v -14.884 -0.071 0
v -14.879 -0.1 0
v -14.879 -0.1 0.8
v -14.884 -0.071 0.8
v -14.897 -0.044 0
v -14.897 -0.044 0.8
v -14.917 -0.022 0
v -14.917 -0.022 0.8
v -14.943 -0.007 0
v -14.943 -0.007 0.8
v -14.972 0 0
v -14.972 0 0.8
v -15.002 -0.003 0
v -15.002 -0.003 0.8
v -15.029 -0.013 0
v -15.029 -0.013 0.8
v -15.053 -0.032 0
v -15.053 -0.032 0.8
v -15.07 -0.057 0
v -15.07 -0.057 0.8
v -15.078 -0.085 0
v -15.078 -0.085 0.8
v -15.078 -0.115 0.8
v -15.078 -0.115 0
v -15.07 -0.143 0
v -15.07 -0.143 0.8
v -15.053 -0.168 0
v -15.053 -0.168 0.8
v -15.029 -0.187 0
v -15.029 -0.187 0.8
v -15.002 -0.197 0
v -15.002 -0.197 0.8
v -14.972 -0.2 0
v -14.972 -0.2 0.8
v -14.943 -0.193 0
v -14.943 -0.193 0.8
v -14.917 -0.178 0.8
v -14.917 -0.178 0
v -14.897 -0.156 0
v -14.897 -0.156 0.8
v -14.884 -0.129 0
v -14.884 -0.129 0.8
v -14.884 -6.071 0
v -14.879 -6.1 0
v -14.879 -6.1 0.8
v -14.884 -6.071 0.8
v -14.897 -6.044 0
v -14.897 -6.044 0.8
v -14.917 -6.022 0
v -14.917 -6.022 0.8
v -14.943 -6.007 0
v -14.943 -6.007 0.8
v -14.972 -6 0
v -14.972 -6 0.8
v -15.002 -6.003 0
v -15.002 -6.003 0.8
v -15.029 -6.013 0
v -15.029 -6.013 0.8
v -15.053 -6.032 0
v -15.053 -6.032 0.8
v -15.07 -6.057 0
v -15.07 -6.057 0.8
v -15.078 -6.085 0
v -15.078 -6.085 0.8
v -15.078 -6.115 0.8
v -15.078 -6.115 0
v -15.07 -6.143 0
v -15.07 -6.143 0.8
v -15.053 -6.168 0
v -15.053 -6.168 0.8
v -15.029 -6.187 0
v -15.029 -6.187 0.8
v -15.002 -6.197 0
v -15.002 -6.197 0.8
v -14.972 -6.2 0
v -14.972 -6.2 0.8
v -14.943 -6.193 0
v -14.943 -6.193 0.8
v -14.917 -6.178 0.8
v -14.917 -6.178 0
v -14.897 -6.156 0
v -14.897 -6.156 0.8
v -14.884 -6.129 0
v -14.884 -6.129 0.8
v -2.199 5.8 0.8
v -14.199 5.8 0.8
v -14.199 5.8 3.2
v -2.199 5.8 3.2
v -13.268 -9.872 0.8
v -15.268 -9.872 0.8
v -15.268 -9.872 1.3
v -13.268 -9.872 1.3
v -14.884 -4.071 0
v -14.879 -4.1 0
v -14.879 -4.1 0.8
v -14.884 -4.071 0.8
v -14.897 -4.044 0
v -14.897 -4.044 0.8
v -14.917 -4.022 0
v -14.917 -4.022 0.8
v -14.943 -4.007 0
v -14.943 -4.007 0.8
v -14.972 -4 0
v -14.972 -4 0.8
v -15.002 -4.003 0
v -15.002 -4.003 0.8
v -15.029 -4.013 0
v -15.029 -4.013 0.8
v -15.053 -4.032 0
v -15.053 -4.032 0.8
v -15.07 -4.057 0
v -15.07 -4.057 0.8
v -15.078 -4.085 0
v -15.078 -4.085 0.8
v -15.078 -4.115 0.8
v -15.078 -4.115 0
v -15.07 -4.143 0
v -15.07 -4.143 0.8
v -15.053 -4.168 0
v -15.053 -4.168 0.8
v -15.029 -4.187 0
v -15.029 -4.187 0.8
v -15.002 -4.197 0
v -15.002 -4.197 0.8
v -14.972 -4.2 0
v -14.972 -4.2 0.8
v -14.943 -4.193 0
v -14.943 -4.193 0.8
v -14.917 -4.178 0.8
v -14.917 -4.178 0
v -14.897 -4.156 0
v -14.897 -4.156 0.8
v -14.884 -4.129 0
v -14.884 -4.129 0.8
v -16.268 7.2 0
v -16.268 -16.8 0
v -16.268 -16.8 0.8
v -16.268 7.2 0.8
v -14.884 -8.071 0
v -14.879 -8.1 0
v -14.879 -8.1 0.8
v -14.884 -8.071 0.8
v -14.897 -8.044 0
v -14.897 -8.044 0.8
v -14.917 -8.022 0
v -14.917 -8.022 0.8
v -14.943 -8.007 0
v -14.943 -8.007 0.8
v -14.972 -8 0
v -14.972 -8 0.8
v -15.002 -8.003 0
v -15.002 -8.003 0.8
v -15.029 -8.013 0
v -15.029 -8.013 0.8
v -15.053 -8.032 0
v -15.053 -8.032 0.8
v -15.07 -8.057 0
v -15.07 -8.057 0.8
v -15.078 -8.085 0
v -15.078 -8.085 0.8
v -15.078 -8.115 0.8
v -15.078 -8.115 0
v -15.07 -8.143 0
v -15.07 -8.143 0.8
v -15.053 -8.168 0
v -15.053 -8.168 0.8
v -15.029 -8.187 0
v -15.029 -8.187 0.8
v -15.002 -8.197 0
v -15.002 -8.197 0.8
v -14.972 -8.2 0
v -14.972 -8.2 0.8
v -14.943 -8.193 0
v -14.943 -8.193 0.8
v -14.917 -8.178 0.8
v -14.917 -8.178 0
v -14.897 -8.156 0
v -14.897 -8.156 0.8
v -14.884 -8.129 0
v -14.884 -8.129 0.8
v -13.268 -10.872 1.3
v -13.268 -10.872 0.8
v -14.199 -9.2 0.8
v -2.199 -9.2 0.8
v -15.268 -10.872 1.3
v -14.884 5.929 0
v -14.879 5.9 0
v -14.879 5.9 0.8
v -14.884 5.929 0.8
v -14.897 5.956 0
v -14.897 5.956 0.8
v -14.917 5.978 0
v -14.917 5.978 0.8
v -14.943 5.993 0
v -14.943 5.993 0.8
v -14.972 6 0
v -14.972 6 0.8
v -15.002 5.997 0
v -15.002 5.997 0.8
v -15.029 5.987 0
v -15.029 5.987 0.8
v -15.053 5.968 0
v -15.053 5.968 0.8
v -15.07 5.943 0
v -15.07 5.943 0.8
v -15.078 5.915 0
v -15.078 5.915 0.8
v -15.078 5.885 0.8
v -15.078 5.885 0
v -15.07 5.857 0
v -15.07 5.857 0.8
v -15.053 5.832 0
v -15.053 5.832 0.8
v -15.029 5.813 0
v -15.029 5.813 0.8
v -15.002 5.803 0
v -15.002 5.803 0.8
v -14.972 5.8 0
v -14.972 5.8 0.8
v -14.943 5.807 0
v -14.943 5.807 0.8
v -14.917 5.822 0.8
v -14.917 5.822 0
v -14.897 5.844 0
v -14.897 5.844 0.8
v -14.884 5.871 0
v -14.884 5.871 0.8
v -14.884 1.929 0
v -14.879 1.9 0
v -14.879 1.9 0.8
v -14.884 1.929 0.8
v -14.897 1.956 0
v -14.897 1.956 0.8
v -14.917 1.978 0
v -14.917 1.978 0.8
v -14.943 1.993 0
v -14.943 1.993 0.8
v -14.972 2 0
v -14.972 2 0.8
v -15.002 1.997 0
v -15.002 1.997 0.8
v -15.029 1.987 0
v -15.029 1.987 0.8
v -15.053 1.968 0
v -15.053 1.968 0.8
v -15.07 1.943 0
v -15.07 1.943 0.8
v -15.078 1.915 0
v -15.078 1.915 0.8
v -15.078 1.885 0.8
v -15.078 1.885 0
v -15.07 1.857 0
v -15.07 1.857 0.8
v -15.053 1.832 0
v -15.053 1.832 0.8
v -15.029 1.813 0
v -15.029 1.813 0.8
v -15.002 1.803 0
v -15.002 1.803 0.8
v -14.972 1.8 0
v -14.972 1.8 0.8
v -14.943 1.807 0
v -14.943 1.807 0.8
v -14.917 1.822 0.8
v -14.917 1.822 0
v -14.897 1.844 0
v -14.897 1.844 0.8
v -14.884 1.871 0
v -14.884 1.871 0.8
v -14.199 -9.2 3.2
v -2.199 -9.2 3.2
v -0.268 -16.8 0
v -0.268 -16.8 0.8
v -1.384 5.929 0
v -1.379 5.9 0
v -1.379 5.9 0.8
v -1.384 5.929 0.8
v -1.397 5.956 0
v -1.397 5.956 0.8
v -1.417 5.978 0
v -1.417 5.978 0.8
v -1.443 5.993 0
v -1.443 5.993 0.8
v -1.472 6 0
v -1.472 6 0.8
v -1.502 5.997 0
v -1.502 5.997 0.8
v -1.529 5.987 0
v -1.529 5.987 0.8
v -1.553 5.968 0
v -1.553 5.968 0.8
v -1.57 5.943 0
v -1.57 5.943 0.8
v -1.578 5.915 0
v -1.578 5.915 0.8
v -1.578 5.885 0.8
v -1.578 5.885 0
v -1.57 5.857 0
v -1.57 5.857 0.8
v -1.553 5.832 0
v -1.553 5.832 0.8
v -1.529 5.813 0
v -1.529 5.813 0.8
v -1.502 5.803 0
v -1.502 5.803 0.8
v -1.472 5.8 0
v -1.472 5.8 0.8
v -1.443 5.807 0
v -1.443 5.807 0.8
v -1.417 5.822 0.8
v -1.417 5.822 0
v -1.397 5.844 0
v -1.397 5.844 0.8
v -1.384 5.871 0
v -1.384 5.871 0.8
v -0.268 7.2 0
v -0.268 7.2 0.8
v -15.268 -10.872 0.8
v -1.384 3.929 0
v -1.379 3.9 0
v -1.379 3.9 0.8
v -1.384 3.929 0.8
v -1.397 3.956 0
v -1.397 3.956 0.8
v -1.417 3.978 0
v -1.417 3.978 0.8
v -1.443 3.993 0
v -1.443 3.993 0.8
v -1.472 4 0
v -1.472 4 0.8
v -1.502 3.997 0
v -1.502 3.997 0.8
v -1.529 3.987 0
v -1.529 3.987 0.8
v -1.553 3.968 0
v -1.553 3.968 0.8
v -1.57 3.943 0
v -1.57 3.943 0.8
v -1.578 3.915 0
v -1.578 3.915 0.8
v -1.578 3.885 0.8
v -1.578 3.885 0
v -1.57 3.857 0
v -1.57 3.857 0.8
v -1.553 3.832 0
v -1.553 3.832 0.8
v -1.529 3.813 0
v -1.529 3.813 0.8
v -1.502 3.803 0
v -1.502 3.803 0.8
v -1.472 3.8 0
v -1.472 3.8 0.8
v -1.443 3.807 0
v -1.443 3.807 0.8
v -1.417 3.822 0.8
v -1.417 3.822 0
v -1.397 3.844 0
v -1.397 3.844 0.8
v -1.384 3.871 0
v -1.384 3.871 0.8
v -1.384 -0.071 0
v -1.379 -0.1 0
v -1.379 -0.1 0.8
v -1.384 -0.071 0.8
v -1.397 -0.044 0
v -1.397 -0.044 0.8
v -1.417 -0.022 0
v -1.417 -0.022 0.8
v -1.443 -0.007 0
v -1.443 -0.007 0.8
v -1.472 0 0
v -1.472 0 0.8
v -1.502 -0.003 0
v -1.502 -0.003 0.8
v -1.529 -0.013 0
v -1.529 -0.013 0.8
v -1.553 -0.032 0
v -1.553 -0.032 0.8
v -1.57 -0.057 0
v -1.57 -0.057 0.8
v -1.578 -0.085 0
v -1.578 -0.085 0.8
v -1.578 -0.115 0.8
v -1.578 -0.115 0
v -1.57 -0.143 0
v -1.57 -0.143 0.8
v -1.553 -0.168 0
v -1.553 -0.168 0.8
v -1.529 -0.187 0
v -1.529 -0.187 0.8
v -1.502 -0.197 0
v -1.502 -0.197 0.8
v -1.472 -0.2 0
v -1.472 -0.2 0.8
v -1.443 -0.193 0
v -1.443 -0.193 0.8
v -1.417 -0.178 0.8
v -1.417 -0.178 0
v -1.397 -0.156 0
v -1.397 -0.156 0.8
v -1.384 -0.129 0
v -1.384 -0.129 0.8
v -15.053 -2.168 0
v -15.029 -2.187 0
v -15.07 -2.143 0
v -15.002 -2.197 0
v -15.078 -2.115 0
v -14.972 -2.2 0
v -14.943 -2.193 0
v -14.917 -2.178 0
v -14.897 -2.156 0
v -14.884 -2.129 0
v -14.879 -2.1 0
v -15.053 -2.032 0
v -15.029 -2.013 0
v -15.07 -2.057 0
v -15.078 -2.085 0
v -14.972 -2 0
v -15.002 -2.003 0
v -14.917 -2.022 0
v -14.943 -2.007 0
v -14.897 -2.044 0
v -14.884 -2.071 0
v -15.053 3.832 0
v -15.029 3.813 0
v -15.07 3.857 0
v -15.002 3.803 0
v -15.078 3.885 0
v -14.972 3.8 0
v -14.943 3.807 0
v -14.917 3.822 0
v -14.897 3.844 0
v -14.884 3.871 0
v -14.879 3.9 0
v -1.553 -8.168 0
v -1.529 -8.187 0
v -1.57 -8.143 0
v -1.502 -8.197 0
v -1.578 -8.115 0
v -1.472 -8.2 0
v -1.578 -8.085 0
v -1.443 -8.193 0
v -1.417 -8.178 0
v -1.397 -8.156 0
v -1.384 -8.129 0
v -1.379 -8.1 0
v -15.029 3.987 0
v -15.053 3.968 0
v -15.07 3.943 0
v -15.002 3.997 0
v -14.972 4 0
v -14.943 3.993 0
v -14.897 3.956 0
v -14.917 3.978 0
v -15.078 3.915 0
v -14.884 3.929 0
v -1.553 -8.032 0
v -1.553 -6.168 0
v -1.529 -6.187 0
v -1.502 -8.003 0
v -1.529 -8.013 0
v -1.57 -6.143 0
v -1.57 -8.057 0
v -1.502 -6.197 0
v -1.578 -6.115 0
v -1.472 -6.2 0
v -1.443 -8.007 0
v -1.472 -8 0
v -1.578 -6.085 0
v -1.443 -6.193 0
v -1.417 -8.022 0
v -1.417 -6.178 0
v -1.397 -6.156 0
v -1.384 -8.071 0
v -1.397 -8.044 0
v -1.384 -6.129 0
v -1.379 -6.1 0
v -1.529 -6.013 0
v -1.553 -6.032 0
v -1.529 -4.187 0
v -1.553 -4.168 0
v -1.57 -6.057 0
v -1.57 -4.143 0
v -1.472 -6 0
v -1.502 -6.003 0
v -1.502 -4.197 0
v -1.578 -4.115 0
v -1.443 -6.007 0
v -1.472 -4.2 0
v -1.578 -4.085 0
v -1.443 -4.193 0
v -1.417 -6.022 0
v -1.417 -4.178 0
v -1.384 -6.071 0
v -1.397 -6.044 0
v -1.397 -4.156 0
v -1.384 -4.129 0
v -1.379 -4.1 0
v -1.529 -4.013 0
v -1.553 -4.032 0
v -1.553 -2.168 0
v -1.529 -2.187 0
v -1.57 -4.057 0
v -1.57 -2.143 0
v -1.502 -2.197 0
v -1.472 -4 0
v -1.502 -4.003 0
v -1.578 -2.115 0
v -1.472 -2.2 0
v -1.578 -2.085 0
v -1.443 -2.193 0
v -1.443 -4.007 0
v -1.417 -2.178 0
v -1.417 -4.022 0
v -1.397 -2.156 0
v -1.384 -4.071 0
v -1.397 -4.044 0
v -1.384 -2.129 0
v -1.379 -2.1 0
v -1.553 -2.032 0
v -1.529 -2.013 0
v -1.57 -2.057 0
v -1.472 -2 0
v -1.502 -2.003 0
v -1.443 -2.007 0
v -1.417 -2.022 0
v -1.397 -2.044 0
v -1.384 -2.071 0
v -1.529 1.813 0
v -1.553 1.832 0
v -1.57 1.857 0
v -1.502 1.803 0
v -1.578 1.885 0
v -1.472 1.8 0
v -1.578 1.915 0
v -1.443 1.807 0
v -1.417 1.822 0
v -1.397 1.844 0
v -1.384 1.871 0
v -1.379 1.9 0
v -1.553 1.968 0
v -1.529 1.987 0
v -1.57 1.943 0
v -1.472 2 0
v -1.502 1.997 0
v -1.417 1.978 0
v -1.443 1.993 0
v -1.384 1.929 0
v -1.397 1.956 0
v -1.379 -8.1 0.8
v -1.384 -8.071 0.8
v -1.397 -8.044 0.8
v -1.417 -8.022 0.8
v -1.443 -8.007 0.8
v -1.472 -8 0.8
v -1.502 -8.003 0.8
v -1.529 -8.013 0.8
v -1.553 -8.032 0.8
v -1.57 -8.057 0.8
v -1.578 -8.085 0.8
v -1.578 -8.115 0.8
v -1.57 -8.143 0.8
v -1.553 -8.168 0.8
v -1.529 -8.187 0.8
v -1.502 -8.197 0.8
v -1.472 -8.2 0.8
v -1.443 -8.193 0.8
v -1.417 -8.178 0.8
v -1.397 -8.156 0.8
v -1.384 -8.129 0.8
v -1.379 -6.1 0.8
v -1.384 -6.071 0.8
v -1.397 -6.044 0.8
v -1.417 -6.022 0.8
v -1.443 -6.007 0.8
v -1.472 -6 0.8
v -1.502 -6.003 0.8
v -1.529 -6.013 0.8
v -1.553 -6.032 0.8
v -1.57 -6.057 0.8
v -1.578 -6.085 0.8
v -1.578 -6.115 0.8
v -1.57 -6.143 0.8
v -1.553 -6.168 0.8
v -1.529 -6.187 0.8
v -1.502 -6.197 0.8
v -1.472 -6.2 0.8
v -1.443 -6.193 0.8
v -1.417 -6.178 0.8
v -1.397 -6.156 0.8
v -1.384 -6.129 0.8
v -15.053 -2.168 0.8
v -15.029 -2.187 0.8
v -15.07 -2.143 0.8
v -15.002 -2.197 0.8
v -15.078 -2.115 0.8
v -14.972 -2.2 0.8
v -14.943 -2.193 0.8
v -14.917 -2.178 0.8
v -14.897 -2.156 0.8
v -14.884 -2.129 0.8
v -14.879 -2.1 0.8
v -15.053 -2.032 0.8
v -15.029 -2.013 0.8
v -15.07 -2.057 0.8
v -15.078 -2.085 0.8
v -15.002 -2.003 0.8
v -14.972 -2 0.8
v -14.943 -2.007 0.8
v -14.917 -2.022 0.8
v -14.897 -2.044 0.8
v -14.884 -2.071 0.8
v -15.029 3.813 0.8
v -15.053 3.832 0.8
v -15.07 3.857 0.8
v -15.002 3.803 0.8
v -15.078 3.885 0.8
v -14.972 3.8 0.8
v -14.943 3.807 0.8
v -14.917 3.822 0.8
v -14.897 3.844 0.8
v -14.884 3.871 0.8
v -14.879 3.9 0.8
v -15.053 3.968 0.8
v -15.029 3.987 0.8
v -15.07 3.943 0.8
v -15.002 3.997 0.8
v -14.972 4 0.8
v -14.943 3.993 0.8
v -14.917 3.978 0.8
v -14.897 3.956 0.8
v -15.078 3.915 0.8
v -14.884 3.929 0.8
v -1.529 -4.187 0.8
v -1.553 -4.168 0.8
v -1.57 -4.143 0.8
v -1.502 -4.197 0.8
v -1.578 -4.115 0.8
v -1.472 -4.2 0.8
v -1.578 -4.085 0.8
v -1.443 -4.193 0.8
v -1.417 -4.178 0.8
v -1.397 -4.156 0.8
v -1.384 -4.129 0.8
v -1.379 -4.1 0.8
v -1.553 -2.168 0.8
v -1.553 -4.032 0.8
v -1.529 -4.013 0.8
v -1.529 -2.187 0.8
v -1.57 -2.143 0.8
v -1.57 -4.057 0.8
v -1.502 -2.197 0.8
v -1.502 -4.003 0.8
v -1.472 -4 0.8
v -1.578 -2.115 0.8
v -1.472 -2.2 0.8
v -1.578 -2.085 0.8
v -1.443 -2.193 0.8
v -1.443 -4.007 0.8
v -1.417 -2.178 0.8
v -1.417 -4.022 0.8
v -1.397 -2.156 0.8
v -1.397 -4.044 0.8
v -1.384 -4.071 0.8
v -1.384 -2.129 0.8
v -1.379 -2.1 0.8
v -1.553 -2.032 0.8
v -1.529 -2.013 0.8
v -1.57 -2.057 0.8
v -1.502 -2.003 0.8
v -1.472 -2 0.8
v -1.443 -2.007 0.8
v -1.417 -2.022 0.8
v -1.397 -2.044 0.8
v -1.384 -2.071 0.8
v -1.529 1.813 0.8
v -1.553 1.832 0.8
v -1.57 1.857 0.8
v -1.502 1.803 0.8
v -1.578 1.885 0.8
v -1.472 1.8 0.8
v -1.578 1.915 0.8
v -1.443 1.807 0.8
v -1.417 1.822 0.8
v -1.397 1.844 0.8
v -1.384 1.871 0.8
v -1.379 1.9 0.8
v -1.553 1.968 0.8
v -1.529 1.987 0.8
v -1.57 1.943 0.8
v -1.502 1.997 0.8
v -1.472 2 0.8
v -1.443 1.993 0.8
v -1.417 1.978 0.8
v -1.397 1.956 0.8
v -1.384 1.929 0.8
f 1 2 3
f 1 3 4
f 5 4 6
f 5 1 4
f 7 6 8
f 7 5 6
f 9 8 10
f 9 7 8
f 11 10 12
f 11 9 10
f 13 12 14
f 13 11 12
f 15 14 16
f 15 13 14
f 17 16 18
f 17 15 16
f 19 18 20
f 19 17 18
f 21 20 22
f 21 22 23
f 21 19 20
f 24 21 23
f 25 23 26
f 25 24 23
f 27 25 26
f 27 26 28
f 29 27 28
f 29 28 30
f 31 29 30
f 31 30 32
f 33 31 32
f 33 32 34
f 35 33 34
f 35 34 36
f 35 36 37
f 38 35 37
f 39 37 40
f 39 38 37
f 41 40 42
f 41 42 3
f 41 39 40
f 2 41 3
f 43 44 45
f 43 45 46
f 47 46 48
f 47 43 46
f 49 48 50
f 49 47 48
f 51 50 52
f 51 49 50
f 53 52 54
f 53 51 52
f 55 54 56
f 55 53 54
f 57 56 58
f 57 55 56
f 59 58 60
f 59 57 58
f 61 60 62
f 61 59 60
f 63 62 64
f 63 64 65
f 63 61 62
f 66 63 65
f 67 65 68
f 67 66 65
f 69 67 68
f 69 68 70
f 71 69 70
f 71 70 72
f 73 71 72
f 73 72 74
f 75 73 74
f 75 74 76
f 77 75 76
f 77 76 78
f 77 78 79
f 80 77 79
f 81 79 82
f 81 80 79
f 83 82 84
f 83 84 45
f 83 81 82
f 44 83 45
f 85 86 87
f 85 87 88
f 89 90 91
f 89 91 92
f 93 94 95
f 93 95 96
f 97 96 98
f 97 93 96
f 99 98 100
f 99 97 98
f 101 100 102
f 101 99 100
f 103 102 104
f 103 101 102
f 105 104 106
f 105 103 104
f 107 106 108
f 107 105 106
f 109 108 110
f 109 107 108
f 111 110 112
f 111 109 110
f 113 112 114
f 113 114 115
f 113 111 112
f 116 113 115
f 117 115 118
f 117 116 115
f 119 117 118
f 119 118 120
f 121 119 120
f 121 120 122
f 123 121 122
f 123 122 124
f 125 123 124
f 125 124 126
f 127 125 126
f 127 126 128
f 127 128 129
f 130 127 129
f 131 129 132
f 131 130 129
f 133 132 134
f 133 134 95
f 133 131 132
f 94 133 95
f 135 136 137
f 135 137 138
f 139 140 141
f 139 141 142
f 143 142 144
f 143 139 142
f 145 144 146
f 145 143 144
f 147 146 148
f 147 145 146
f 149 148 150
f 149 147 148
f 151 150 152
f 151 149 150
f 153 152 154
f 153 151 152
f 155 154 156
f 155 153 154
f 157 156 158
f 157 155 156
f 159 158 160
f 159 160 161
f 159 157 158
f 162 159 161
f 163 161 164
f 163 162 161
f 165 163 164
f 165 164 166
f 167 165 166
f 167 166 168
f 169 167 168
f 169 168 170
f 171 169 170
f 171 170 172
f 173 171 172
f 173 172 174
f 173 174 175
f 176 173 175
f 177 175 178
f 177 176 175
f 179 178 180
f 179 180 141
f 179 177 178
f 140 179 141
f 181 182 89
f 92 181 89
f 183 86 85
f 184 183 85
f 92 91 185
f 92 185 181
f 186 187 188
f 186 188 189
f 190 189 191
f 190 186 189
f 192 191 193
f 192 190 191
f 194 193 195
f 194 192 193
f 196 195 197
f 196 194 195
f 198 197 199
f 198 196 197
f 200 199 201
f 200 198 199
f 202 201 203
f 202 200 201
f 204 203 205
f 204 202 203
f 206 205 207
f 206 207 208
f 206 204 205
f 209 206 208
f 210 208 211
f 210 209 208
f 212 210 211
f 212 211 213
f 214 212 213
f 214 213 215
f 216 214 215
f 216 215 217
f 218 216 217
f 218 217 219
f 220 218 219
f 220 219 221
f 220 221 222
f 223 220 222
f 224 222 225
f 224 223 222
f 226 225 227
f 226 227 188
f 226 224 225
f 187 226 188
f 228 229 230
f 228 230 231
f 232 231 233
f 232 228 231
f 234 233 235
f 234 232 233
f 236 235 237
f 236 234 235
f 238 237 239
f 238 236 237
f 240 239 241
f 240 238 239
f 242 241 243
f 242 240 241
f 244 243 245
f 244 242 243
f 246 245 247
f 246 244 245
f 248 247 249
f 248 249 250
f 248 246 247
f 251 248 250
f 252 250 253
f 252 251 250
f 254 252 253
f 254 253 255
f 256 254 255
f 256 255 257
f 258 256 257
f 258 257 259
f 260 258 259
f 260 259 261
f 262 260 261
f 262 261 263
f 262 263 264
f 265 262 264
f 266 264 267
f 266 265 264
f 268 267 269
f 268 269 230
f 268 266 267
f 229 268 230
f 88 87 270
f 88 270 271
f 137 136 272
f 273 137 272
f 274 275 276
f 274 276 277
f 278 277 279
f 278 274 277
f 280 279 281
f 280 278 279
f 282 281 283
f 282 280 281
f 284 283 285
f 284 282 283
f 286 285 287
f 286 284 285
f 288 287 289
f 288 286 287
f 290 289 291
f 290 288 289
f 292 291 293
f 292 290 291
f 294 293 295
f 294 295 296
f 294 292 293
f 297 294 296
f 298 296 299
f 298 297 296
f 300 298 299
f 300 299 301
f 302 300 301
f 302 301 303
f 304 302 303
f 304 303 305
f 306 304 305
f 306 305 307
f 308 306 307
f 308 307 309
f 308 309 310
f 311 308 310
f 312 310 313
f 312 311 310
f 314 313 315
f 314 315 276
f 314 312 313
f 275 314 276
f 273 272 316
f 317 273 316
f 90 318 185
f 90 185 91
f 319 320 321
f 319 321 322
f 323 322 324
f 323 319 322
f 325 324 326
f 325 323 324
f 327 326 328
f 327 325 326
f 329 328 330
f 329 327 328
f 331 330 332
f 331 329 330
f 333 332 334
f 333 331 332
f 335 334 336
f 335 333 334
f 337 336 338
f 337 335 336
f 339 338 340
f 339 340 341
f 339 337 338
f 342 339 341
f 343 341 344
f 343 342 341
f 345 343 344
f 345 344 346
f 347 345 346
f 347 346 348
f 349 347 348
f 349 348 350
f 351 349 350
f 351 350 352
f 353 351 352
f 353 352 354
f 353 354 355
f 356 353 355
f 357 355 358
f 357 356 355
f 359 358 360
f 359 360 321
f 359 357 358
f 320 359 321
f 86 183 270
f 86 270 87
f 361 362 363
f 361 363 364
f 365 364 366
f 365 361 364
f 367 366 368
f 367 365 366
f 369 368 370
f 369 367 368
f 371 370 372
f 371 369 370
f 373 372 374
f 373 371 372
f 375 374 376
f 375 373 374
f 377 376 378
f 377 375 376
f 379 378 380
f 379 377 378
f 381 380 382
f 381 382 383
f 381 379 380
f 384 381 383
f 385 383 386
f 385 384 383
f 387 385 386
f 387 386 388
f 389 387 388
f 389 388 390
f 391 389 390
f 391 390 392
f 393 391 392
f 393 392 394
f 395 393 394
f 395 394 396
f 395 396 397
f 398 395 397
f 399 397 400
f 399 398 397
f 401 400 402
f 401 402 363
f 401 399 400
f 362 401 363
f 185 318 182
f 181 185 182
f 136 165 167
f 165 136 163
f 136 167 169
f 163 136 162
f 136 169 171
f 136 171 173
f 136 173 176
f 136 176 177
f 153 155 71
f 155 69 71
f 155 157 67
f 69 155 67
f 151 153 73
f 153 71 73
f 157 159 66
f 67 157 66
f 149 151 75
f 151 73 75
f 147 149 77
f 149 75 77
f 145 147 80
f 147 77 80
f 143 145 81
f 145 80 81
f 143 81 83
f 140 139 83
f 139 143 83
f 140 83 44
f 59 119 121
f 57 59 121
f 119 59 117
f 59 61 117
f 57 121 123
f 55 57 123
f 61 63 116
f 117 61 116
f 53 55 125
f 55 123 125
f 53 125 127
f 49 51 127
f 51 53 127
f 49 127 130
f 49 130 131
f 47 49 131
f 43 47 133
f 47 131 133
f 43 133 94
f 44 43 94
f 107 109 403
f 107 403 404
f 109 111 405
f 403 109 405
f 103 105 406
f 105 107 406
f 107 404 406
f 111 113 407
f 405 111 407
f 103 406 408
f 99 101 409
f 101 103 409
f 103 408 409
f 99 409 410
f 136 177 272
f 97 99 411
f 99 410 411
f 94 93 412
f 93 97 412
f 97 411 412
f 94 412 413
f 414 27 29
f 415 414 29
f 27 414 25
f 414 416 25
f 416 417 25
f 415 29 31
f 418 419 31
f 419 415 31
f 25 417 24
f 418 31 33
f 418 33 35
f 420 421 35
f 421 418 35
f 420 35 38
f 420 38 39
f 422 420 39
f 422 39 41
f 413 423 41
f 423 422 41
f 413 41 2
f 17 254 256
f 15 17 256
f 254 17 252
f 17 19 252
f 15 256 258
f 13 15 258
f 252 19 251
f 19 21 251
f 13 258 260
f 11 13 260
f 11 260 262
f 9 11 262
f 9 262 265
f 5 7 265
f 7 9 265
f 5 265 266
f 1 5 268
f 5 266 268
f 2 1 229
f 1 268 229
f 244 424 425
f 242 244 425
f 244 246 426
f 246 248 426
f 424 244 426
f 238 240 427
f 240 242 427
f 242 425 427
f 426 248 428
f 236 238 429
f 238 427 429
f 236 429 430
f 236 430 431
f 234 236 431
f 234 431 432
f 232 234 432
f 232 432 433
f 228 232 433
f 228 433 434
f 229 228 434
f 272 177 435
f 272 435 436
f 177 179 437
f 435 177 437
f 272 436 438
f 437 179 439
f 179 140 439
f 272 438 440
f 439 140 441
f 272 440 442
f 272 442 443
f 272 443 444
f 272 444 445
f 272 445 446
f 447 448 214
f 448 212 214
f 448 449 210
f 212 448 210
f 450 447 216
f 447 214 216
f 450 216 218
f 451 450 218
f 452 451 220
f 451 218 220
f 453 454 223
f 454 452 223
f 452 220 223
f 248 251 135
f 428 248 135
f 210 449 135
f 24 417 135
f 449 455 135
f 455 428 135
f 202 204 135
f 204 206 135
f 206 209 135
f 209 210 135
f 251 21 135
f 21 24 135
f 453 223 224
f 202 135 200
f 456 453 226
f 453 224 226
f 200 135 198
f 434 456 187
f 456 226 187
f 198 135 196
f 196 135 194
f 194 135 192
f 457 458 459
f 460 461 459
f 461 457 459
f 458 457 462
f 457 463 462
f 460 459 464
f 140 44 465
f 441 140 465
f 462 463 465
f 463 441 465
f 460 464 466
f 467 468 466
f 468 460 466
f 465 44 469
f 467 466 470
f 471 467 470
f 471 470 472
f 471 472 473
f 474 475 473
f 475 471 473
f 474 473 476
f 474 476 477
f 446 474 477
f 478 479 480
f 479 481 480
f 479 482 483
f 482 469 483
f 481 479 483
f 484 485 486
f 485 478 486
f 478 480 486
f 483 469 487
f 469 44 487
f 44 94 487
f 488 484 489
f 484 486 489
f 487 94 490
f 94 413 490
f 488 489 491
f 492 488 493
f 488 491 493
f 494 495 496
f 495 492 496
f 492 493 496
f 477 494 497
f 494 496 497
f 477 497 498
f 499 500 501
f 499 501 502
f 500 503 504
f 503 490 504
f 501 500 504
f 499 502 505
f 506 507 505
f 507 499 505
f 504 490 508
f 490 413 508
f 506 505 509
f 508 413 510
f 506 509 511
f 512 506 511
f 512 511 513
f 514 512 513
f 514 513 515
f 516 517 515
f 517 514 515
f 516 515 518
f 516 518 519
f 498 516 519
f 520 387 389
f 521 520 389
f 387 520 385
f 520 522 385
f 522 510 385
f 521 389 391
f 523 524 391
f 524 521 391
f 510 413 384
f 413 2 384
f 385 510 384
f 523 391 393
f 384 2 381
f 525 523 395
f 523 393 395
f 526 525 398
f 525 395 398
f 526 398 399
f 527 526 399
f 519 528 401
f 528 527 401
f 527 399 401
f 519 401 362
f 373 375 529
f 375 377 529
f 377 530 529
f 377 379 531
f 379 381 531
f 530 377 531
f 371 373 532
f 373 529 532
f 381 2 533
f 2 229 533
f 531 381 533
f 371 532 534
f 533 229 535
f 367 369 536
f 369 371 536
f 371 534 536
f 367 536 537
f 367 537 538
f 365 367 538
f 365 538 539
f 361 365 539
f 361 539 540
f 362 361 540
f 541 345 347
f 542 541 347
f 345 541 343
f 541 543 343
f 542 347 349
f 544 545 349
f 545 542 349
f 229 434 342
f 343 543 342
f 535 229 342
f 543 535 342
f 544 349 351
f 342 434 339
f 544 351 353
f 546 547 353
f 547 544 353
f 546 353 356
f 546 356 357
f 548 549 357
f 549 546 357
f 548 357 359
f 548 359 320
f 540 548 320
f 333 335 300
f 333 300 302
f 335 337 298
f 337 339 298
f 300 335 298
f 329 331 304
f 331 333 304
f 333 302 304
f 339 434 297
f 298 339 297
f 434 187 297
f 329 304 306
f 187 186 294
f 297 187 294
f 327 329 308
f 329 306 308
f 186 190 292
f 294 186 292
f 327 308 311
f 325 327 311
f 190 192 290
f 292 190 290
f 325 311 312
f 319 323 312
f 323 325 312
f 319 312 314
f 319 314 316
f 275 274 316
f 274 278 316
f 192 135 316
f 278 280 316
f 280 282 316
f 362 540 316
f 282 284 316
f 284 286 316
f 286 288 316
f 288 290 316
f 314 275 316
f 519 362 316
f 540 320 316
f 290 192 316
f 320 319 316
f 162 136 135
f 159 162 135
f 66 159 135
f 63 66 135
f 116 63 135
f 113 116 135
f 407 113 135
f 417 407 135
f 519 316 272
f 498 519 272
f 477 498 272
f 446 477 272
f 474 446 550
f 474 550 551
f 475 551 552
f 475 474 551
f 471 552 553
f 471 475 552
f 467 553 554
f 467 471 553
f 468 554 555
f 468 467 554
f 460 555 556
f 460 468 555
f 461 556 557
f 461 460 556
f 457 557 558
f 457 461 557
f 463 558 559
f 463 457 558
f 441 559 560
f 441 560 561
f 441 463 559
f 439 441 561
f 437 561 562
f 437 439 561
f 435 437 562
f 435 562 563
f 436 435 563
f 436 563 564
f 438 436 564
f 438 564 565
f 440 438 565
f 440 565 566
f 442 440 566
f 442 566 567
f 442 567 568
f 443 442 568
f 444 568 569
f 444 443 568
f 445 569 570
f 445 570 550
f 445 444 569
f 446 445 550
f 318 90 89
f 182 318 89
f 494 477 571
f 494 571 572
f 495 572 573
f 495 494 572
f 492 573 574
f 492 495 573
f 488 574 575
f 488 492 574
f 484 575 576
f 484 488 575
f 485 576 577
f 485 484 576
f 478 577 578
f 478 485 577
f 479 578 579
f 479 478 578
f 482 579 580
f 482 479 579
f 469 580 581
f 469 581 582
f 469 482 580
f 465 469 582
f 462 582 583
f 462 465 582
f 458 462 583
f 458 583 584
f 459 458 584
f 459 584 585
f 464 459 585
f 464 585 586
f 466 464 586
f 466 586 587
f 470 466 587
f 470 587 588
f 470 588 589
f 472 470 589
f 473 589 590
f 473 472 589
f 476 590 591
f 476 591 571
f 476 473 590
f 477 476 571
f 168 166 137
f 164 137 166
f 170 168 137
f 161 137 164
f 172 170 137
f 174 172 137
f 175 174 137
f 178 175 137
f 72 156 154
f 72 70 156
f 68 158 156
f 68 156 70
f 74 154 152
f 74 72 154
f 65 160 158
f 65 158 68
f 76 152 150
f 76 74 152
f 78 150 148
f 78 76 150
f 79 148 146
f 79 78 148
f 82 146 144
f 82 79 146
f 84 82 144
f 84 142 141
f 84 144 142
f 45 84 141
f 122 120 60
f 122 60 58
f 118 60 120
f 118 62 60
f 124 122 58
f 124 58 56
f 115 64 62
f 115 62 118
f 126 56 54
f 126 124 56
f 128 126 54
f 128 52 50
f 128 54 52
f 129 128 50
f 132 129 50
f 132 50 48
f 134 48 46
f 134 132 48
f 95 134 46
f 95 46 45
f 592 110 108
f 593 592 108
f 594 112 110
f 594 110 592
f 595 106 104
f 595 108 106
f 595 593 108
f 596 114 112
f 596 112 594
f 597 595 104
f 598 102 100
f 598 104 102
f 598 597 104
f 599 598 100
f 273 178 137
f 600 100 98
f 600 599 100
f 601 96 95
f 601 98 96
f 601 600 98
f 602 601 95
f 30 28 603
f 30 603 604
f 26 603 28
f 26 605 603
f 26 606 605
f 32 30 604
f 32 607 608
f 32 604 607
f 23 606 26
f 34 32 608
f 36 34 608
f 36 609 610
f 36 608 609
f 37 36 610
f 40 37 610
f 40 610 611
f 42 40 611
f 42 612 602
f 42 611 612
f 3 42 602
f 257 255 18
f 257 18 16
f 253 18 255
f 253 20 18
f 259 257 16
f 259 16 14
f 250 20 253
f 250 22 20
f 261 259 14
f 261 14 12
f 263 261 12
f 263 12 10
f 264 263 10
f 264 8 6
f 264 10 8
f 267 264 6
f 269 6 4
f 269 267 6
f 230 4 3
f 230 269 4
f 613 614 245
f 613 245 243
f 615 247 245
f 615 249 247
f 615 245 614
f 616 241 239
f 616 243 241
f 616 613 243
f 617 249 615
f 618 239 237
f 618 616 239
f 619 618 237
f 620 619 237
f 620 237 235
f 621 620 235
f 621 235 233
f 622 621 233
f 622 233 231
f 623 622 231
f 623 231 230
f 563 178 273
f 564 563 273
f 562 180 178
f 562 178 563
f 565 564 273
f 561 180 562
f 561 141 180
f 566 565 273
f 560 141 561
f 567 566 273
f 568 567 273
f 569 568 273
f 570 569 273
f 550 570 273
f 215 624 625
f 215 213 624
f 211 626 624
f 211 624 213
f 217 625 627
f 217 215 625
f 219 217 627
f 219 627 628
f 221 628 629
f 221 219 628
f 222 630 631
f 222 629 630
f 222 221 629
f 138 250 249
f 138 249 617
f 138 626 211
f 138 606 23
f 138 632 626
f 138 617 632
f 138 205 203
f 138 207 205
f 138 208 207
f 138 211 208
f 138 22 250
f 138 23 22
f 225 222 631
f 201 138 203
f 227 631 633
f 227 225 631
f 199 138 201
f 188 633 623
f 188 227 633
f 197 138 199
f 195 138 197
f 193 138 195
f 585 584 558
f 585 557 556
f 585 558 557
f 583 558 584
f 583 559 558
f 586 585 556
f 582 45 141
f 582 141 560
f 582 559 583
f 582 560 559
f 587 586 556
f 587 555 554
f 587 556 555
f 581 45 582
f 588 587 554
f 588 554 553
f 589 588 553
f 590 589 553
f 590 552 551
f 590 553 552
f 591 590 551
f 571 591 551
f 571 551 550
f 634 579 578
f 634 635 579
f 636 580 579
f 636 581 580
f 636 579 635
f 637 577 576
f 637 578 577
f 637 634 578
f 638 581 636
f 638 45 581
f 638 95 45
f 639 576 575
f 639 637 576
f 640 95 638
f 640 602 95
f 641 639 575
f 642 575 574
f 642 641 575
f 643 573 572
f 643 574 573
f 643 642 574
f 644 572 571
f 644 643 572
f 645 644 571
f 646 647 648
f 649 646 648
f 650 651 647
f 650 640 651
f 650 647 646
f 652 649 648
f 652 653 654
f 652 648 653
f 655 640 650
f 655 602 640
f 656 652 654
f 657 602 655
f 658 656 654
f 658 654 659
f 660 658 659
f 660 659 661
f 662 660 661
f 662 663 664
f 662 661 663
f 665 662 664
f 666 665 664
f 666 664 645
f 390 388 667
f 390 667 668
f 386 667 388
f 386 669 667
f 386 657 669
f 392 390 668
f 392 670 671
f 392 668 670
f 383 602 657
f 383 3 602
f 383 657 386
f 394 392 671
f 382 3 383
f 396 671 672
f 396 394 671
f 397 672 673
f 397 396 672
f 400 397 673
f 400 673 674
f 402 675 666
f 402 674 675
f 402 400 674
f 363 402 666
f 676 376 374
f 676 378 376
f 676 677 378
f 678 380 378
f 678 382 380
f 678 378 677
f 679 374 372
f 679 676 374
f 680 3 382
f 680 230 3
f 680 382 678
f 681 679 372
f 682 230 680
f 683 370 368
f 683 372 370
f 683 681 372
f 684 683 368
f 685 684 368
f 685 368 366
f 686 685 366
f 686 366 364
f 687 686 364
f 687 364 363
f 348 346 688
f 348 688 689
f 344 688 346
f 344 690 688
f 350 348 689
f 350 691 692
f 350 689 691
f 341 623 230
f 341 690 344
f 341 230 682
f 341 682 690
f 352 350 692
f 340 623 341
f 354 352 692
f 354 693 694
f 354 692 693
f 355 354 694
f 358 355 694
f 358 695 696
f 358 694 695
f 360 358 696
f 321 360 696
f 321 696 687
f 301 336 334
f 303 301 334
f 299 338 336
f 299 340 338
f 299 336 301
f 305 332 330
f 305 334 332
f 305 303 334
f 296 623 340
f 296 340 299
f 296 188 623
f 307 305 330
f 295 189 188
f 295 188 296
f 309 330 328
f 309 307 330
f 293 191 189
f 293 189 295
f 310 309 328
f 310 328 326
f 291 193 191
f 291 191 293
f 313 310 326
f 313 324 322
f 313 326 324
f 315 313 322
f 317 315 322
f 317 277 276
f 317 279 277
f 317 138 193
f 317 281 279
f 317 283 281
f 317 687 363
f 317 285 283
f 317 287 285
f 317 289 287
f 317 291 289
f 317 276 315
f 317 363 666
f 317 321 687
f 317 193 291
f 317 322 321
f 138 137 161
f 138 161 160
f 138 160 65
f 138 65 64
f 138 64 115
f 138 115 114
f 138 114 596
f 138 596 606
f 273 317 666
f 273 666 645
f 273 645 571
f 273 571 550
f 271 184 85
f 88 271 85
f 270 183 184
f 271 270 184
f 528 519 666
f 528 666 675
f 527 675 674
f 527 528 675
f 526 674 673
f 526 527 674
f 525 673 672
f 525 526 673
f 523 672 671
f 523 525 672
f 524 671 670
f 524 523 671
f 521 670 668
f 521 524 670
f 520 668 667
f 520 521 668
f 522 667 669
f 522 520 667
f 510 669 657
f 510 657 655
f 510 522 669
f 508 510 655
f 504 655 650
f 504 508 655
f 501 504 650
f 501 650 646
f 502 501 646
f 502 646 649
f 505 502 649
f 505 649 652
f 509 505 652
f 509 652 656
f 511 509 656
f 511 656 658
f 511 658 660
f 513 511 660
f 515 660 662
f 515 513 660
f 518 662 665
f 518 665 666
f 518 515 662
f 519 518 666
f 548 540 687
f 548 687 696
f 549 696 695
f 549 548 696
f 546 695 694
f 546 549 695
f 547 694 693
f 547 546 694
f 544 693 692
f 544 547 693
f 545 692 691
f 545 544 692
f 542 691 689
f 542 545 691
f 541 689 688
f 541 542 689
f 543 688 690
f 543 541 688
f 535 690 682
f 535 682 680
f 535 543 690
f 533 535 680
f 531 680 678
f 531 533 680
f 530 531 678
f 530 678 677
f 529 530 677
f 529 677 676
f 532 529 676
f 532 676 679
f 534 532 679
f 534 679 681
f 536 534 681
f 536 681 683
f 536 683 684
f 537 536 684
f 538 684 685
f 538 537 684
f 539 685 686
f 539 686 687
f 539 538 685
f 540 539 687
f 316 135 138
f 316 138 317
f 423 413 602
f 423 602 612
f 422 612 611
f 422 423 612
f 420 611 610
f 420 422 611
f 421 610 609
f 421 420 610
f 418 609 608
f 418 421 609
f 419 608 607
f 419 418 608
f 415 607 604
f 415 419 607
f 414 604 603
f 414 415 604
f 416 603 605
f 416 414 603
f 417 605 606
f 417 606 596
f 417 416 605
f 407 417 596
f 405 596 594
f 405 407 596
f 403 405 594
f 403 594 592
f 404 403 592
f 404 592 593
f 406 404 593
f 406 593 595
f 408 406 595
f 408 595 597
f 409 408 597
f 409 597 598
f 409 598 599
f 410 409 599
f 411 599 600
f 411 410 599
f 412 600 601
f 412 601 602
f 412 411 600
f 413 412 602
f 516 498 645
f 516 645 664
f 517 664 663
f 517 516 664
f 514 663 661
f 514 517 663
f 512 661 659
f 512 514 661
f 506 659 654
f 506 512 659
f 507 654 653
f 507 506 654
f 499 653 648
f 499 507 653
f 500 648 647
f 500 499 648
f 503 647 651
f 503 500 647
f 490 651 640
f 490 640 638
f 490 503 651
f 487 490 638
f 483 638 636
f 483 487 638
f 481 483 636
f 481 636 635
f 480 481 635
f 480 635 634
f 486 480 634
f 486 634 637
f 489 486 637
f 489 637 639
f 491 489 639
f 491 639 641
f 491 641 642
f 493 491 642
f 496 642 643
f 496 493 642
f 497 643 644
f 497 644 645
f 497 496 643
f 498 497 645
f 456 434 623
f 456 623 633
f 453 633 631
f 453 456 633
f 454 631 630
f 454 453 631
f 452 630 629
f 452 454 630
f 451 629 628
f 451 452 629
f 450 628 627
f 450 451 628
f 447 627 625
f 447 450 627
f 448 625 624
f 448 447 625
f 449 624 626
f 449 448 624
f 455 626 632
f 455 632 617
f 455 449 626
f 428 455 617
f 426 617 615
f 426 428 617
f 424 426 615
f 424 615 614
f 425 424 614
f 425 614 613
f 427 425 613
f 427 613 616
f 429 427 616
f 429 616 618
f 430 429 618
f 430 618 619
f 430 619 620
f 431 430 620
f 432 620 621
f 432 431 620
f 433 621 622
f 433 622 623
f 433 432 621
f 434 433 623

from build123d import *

# Parameters (mm, degrees)
F0_W     = 16
F0_H     = 24
F0_R     = 0.1
F1_DEPTH = 0.8
F2_W     = 12
F2_H     = 15
F3_DEPTH = 2.4
F4_W     = 2
F4_H     = 1
F5_DEPTH = 0.5


with BuildPart() as f1:
    # F0 (on Top) → F1 (new body)
    with BuildSketch(Plane.XY):
        with Locations((-8.267652, -4.8)):
            Rectangle(F0_W, F0_H)
        with Locations((-14.979416, -8.1)):
            Circle(F0_R, mode=Mode.SUBTRACT)
        with Locations((-14.979416, -6.1)):
            Circle(F0_R, mode=Mode.SUBTRACT)
        with Locations((-1.479416, -8.1)):
            Circle(F0_R, mode=Mode.SUBTRACT)
        with Locations((-1.479416, -6.1)):
            Circle(F0_R, mode=Mode.SUBTRACT)
        with Locations((-14.979416, -4.1)):
            Circle(F0_R, mode=Mode.SUBTRACT)
        with Locations((-14.979416, -2.1)):
            Circle(F0_R, mode=Mode.SUBTRACT)
        with Locations((-14.979416, -0.1)):
            Circle(F0_R, mode=Mode.SUBTRACT)
        with Locations((-14.979416, 1.9)):
            Circle(F0_R, mode=Mode.SUBTRACT)
        with Locations((-14.979416, 3.9)):
            Circle(F0_R, mode=Mode.SUBTRACT)
        with Locations((-14.979416, 5.9)):
            Circle(F0_R, mode=Mode.SUBTRACT)
        with Locations((-1.479416, -4.1)):
            Circle(F0_R, mode=Mode.SUBTRACT)
        with Locations((-1.479416, -2.1)):
            Circle(F0_R, mode=Mode.SUBTRACT)
        with Locations((-1.479416, -0.1)):
            Circle(F0_R, mode=Mode.SUBTRACT)
        with Locations((-1.479416, 1.9)):
            Circle(F0_R, mode=Mode.SUBTRACT)
        with Locations((-1.479416, 3.9)):
            Circle(F0_R, mode=Mode.SUBTRACT)
        with Locations((-1.479416, 5.9)):
            Circle(F0_R, mode=Mode.SUBTRACT)
    extrude(amount=F1_DEPTH)


with BuildPart() as f3:
    # F2 (on face) → F3 (new body)
    with BuildSketch(Plane.XY.offset(0.8)):
        with Locations((-8.199081, -1.7)):
            Rectangle(F2_W, F2_H)
    extrude(amount=F3_DEPTH)


with BuildPart() as f5:
    # F4 (on face) → F5 (new body)
    with BuildSketch(Plane.XY.offset(0.8)):
        with Locations((-14.267652, -10.371813)):
            Rectangle(F4_W, F4_H)
    extrude(amount=F5_DEPTH)


solid = Compound([f1.part, f3.part, f5.part])
